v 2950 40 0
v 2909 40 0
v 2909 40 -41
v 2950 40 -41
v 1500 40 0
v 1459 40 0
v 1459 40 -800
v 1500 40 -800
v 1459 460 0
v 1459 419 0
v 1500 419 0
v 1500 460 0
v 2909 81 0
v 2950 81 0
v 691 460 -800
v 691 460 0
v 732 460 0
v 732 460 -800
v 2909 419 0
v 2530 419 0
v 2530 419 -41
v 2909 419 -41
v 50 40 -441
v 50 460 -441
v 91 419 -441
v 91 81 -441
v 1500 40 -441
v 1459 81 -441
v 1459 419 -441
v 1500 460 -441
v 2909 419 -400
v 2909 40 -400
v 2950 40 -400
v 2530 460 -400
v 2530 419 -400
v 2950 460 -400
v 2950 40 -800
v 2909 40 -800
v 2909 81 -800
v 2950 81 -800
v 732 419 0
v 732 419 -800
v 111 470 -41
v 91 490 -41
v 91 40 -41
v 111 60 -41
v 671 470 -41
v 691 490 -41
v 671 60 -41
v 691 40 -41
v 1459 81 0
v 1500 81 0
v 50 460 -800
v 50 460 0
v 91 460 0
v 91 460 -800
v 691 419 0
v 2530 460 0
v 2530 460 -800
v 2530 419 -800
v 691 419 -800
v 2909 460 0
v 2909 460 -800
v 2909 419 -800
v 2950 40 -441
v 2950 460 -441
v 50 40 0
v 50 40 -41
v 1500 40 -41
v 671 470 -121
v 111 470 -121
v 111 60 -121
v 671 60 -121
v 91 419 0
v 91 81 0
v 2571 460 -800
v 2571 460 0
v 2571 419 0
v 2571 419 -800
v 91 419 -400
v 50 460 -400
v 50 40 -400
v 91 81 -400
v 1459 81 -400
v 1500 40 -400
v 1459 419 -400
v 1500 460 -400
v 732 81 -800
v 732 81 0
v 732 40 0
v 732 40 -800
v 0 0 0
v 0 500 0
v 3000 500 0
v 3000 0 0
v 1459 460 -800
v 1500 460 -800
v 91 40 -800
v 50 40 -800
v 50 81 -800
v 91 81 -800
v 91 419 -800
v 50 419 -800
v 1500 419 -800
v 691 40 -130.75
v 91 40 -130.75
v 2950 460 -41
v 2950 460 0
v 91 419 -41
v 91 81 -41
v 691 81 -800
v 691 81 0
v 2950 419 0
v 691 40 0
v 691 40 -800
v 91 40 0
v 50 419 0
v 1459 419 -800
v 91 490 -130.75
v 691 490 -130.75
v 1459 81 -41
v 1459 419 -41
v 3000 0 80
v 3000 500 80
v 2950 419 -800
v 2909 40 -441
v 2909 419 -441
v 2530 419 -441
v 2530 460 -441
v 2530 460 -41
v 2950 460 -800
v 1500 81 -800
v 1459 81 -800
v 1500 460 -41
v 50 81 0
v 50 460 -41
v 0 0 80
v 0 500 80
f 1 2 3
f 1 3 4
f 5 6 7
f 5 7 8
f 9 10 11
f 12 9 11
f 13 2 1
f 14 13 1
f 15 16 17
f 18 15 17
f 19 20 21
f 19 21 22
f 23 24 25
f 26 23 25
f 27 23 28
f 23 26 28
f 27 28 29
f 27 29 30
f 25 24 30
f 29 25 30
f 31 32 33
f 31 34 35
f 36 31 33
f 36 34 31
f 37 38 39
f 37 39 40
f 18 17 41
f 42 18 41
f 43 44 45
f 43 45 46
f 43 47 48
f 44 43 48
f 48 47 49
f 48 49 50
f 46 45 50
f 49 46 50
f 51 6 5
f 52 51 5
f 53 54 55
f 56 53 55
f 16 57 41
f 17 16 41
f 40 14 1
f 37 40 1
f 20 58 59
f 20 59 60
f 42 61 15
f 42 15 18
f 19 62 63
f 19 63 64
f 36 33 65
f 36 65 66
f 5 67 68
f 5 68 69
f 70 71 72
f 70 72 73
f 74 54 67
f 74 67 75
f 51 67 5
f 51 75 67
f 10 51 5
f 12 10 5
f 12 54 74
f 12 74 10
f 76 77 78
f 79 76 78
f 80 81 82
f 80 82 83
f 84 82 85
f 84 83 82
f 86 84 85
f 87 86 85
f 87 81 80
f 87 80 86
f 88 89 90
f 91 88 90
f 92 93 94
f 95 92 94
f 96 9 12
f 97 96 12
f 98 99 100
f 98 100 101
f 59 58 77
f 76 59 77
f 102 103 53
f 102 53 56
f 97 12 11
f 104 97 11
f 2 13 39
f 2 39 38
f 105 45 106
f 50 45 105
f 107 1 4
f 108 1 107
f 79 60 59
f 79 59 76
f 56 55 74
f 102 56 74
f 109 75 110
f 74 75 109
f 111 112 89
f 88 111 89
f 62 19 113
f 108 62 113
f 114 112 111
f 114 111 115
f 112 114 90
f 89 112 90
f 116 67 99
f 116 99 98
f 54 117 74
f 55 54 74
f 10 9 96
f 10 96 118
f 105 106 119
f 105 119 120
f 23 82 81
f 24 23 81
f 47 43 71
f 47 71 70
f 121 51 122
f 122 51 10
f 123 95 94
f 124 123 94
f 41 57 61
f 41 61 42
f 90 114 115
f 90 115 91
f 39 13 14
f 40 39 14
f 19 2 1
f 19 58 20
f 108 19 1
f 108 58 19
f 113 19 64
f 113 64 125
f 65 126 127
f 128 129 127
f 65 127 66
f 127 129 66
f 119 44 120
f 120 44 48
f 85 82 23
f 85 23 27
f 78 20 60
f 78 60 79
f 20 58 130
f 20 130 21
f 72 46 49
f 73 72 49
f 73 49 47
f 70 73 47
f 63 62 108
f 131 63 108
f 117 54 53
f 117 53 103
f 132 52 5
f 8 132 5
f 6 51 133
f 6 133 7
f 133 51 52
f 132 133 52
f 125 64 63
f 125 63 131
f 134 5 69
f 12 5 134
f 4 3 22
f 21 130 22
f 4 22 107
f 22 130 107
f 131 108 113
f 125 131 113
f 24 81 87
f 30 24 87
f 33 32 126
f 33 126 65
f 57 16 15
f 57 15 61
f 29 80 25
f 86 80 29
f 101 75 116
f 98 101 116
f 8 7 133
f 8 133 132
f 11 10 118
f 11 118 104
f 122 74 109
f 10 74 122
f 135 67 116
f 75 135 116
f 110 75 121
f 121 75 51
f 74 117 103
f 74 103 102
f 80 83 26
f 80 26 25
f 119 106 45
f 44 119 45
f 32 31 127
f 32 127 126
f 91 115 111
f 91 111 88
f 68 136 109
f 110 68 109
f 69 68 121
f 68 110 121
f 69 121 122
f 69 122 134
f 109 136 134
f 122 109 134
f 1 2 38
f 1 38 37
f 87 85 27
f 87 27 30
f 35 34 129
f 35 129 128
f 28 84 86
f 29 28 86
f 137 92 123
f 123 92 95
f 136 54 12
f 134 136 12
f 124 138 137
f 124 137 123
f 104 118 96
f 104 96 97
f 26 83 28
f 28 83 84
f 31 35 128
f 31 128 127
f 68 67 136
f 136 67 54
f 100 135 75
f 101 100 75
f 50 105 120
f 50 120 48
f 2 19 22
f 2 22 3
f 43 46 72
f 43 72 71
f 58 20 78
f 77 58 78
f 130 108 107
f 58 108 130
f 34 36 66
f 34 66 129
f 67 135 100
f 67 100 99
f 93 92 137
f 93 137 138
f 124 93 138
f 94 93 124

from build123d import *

# Parameters (mm, degrees)
F0_W      = 3000
F0_H      = 500
F1_DEPTH  = 80
F2_W      = 41
F2_H      = 41
F3_DEPTH  = 800
F4_W      = 1450
F4_H      = 420
F4_W_2    = 1368
F4_H_2    = 338
F5_DEPTH  = 41
F6_START  = -400
F6_DEPTH  = 41
F7_W      = 600
F7_H      = 89.75
F8_DEPTH  = 450
F9_W      = 560
F9_H      = 410
F10_DEPTH = 80


with BuildPart() as f1:
    # F0 (on Top) → F1 (new body)
    with BuildSketch(Plane.XY):
        with Locations((1500, 250)):
            Rectangle(F0_W, F0_H)
    extrude(amount=F1_DEPTH)


with BuildPart() as f3:
    # F2 (on face) → F3 (new body)
    with BuildSketch(Plane(origin=(0, 0, 0), x_dir=(1, 0, 0), z_dir=(0, 0, -1))):
        with Locations((70.5, -60.5)):
            Rectangle(F2_W, F2_H)
    extrude(amount=F3_DEPTH)


with BuildPart() as f3b:
    # F2 (on face) → F3, piece 2 (new body)
    with BuildSketch(Plane(origin=(0, 0, 0), x_dir=(1, 0, 0), z_dir=(0, 0, -1))):
        with Locations((70.5, -439.5)):
            Rectangle(F2_W, F2_H)
    extrude(amount=F3_DEPTH)


with BuildPart() as f3c:
    # F2 (on face) → F3, piece 3 (new body)
    with BuildSketch(Plane(origin=(0, 0, 0), x_dir=(1, 0, 0), z_dir=(0, 0, -1))):
        with Locations((2929.5, -60.5)):
            Rectangle(F2_W, F2_H)
    extrude(amount=F3_DEPTH)


with BuildPart() as f3d:
    # F2 (on face) → F3, piece 4 (new body)
    with BuildSketch(Plane(origin=(0, 0, 0), x_dir=(1, 0, 0), z_dir=(0, 0, -1))):
        with Locations((2929.5, -439.5)):
            Rectangle(F2_W, F2_H)
    extrude(amount=F3_DEPTH)


with BuildPart() as f3e:
    # F2 (on face) → F3, piece 5 (new body)
    with BuildSketch(Plane(origin=(0, 0, 0), x_dir=(1, 0, 0), z_dir=(0, 0, -1))):
        with Locations((1479.5, -439.5)):
            Rectangle(F2_W, F2_H)
    extrude(amount=F3_DEPTH)


with BuildPart() as f3f:
    # F2 (on face) → F3, piece 6 (new body)
    with BuildSketch(Plane(origin=(0, 0, 0), x_dir=(1, 0, 0), z_dir=(0, 0, -1))):
        with Locations((1479.5, -60.5)):
            Rectangle(F2_W, F2_H)
    extrude(amount=F3_DEPTH)


with BuildPart() as f3g:
    # F2 (on face) → F3, piece 7 (new body)
    with BuildSketch(Plane(origin=(0, 0, 0), x_dir=(1, 0, 0), z_dir=(0, 0, -1))):
        with Locations((2550.5, -439.5)):
            Rectangle(F2_W, F2_H)
    extrude(amount=F3_DEPTH)


with BuildPart() as f3h:
    # F2 (on face) → F3, piece 8 (new body)
    with BuildSketch(Plane(origin=(0, 0, 0), x_dir=(1, 0, 0), z_dir=(0, 0, -1))):
        with Locations((711.5, -60.5)):
            Rectangle(F2_W, F2_H)
    extrude(amount=F3_DEPTH)


with BuildPart() as f3i:
    # F2 (on face) → F3, piece 9 (new body)
    with BuildSketch(Plane(origin=(0, 0, 0), x_dir=(1, 0, 0), z_dir=(0, 0, -1))):
        with Locations((711.5, -439.5)):
            Rectangle(F2_W, F2_H)
    extrude(amount=F3_DEPTH)


with BuildPart() as f5:
    # F4 (on face) → F5 (new body)
    with BuildSketch(Plane.XY):
        with Locations((775, 250)):
            Rectangle(F4_W, F4_H)
        with Locations((775, 250)):
            Rectangle(F4_W_2, F4_H_2, mode=Mode.SUBTRACT)
    extrude(amount=-F5_DEPTH)


with BuildPart() as f5b:
    # F4 (on face) → F5, piece 2 (new body)
    with BuildSketch(Plane.XY):
        Polygon((2909, 40), (2950, 40), (2950, 419), (2950, 460), (2909, 460), (2530, 460), (2530, 419), (2909, 419), align=None)
    extrude(amount=-F5_DEPTH)


with BuildPart() as f6:
    # F4 (on face) → F6 (new body)
    with BuildSketch(Plane.XY.offset(F6_START)):
        with Locations((775, 250)):
            Rectangle(F4_W, F4_H)
        with Locations((775, 250)):
            Rectangle(F4_W_2, F4_H_2, mode=Mode.SUBTRACT)
    extrude(amount=-F6_DEPTH)


with BuildPart() as f6b:
    # F4 (on face) → F6, piece 2 (new body)
    with BuildSketch(Plane.XY.offset(F6_START)):
        Polygon((2909, 40), (2950, 40), (2950, 419), (2950, 460), (2909, 460), (2530, 460), (2530, 419), (2909, 419), align=None)
    extrude(amount=-F6_DEPTH)


with BuildPart() as f8:
    # F7 (on face) → F8 (new body)
    with BuildSketch(Plane.XZ.offset(-40)):
        with Locations((391, -85.875)):
            Rectangle(F7_W, F7_H)
    extrude(amount=-F8_DEPTH)

    # F9 (on face) → F10 (cut)
    with BuildSketch(Plane.XY.offset(-41)):
        with Locations((391, 265)):
            Rectangle(F9_W, F9_H)
    extrude(amount=-F10_DEPTH, mode=Mode.SUBTRACT)


solid = Compound([f1.part, f3.part, f3b.part, f3c.part, f3d.part, f3e.part, f3f.part, f3g.part, f3h.part, f3i.part, f5.part, f5b.part, f6.part, f6b.part, f8.part])
